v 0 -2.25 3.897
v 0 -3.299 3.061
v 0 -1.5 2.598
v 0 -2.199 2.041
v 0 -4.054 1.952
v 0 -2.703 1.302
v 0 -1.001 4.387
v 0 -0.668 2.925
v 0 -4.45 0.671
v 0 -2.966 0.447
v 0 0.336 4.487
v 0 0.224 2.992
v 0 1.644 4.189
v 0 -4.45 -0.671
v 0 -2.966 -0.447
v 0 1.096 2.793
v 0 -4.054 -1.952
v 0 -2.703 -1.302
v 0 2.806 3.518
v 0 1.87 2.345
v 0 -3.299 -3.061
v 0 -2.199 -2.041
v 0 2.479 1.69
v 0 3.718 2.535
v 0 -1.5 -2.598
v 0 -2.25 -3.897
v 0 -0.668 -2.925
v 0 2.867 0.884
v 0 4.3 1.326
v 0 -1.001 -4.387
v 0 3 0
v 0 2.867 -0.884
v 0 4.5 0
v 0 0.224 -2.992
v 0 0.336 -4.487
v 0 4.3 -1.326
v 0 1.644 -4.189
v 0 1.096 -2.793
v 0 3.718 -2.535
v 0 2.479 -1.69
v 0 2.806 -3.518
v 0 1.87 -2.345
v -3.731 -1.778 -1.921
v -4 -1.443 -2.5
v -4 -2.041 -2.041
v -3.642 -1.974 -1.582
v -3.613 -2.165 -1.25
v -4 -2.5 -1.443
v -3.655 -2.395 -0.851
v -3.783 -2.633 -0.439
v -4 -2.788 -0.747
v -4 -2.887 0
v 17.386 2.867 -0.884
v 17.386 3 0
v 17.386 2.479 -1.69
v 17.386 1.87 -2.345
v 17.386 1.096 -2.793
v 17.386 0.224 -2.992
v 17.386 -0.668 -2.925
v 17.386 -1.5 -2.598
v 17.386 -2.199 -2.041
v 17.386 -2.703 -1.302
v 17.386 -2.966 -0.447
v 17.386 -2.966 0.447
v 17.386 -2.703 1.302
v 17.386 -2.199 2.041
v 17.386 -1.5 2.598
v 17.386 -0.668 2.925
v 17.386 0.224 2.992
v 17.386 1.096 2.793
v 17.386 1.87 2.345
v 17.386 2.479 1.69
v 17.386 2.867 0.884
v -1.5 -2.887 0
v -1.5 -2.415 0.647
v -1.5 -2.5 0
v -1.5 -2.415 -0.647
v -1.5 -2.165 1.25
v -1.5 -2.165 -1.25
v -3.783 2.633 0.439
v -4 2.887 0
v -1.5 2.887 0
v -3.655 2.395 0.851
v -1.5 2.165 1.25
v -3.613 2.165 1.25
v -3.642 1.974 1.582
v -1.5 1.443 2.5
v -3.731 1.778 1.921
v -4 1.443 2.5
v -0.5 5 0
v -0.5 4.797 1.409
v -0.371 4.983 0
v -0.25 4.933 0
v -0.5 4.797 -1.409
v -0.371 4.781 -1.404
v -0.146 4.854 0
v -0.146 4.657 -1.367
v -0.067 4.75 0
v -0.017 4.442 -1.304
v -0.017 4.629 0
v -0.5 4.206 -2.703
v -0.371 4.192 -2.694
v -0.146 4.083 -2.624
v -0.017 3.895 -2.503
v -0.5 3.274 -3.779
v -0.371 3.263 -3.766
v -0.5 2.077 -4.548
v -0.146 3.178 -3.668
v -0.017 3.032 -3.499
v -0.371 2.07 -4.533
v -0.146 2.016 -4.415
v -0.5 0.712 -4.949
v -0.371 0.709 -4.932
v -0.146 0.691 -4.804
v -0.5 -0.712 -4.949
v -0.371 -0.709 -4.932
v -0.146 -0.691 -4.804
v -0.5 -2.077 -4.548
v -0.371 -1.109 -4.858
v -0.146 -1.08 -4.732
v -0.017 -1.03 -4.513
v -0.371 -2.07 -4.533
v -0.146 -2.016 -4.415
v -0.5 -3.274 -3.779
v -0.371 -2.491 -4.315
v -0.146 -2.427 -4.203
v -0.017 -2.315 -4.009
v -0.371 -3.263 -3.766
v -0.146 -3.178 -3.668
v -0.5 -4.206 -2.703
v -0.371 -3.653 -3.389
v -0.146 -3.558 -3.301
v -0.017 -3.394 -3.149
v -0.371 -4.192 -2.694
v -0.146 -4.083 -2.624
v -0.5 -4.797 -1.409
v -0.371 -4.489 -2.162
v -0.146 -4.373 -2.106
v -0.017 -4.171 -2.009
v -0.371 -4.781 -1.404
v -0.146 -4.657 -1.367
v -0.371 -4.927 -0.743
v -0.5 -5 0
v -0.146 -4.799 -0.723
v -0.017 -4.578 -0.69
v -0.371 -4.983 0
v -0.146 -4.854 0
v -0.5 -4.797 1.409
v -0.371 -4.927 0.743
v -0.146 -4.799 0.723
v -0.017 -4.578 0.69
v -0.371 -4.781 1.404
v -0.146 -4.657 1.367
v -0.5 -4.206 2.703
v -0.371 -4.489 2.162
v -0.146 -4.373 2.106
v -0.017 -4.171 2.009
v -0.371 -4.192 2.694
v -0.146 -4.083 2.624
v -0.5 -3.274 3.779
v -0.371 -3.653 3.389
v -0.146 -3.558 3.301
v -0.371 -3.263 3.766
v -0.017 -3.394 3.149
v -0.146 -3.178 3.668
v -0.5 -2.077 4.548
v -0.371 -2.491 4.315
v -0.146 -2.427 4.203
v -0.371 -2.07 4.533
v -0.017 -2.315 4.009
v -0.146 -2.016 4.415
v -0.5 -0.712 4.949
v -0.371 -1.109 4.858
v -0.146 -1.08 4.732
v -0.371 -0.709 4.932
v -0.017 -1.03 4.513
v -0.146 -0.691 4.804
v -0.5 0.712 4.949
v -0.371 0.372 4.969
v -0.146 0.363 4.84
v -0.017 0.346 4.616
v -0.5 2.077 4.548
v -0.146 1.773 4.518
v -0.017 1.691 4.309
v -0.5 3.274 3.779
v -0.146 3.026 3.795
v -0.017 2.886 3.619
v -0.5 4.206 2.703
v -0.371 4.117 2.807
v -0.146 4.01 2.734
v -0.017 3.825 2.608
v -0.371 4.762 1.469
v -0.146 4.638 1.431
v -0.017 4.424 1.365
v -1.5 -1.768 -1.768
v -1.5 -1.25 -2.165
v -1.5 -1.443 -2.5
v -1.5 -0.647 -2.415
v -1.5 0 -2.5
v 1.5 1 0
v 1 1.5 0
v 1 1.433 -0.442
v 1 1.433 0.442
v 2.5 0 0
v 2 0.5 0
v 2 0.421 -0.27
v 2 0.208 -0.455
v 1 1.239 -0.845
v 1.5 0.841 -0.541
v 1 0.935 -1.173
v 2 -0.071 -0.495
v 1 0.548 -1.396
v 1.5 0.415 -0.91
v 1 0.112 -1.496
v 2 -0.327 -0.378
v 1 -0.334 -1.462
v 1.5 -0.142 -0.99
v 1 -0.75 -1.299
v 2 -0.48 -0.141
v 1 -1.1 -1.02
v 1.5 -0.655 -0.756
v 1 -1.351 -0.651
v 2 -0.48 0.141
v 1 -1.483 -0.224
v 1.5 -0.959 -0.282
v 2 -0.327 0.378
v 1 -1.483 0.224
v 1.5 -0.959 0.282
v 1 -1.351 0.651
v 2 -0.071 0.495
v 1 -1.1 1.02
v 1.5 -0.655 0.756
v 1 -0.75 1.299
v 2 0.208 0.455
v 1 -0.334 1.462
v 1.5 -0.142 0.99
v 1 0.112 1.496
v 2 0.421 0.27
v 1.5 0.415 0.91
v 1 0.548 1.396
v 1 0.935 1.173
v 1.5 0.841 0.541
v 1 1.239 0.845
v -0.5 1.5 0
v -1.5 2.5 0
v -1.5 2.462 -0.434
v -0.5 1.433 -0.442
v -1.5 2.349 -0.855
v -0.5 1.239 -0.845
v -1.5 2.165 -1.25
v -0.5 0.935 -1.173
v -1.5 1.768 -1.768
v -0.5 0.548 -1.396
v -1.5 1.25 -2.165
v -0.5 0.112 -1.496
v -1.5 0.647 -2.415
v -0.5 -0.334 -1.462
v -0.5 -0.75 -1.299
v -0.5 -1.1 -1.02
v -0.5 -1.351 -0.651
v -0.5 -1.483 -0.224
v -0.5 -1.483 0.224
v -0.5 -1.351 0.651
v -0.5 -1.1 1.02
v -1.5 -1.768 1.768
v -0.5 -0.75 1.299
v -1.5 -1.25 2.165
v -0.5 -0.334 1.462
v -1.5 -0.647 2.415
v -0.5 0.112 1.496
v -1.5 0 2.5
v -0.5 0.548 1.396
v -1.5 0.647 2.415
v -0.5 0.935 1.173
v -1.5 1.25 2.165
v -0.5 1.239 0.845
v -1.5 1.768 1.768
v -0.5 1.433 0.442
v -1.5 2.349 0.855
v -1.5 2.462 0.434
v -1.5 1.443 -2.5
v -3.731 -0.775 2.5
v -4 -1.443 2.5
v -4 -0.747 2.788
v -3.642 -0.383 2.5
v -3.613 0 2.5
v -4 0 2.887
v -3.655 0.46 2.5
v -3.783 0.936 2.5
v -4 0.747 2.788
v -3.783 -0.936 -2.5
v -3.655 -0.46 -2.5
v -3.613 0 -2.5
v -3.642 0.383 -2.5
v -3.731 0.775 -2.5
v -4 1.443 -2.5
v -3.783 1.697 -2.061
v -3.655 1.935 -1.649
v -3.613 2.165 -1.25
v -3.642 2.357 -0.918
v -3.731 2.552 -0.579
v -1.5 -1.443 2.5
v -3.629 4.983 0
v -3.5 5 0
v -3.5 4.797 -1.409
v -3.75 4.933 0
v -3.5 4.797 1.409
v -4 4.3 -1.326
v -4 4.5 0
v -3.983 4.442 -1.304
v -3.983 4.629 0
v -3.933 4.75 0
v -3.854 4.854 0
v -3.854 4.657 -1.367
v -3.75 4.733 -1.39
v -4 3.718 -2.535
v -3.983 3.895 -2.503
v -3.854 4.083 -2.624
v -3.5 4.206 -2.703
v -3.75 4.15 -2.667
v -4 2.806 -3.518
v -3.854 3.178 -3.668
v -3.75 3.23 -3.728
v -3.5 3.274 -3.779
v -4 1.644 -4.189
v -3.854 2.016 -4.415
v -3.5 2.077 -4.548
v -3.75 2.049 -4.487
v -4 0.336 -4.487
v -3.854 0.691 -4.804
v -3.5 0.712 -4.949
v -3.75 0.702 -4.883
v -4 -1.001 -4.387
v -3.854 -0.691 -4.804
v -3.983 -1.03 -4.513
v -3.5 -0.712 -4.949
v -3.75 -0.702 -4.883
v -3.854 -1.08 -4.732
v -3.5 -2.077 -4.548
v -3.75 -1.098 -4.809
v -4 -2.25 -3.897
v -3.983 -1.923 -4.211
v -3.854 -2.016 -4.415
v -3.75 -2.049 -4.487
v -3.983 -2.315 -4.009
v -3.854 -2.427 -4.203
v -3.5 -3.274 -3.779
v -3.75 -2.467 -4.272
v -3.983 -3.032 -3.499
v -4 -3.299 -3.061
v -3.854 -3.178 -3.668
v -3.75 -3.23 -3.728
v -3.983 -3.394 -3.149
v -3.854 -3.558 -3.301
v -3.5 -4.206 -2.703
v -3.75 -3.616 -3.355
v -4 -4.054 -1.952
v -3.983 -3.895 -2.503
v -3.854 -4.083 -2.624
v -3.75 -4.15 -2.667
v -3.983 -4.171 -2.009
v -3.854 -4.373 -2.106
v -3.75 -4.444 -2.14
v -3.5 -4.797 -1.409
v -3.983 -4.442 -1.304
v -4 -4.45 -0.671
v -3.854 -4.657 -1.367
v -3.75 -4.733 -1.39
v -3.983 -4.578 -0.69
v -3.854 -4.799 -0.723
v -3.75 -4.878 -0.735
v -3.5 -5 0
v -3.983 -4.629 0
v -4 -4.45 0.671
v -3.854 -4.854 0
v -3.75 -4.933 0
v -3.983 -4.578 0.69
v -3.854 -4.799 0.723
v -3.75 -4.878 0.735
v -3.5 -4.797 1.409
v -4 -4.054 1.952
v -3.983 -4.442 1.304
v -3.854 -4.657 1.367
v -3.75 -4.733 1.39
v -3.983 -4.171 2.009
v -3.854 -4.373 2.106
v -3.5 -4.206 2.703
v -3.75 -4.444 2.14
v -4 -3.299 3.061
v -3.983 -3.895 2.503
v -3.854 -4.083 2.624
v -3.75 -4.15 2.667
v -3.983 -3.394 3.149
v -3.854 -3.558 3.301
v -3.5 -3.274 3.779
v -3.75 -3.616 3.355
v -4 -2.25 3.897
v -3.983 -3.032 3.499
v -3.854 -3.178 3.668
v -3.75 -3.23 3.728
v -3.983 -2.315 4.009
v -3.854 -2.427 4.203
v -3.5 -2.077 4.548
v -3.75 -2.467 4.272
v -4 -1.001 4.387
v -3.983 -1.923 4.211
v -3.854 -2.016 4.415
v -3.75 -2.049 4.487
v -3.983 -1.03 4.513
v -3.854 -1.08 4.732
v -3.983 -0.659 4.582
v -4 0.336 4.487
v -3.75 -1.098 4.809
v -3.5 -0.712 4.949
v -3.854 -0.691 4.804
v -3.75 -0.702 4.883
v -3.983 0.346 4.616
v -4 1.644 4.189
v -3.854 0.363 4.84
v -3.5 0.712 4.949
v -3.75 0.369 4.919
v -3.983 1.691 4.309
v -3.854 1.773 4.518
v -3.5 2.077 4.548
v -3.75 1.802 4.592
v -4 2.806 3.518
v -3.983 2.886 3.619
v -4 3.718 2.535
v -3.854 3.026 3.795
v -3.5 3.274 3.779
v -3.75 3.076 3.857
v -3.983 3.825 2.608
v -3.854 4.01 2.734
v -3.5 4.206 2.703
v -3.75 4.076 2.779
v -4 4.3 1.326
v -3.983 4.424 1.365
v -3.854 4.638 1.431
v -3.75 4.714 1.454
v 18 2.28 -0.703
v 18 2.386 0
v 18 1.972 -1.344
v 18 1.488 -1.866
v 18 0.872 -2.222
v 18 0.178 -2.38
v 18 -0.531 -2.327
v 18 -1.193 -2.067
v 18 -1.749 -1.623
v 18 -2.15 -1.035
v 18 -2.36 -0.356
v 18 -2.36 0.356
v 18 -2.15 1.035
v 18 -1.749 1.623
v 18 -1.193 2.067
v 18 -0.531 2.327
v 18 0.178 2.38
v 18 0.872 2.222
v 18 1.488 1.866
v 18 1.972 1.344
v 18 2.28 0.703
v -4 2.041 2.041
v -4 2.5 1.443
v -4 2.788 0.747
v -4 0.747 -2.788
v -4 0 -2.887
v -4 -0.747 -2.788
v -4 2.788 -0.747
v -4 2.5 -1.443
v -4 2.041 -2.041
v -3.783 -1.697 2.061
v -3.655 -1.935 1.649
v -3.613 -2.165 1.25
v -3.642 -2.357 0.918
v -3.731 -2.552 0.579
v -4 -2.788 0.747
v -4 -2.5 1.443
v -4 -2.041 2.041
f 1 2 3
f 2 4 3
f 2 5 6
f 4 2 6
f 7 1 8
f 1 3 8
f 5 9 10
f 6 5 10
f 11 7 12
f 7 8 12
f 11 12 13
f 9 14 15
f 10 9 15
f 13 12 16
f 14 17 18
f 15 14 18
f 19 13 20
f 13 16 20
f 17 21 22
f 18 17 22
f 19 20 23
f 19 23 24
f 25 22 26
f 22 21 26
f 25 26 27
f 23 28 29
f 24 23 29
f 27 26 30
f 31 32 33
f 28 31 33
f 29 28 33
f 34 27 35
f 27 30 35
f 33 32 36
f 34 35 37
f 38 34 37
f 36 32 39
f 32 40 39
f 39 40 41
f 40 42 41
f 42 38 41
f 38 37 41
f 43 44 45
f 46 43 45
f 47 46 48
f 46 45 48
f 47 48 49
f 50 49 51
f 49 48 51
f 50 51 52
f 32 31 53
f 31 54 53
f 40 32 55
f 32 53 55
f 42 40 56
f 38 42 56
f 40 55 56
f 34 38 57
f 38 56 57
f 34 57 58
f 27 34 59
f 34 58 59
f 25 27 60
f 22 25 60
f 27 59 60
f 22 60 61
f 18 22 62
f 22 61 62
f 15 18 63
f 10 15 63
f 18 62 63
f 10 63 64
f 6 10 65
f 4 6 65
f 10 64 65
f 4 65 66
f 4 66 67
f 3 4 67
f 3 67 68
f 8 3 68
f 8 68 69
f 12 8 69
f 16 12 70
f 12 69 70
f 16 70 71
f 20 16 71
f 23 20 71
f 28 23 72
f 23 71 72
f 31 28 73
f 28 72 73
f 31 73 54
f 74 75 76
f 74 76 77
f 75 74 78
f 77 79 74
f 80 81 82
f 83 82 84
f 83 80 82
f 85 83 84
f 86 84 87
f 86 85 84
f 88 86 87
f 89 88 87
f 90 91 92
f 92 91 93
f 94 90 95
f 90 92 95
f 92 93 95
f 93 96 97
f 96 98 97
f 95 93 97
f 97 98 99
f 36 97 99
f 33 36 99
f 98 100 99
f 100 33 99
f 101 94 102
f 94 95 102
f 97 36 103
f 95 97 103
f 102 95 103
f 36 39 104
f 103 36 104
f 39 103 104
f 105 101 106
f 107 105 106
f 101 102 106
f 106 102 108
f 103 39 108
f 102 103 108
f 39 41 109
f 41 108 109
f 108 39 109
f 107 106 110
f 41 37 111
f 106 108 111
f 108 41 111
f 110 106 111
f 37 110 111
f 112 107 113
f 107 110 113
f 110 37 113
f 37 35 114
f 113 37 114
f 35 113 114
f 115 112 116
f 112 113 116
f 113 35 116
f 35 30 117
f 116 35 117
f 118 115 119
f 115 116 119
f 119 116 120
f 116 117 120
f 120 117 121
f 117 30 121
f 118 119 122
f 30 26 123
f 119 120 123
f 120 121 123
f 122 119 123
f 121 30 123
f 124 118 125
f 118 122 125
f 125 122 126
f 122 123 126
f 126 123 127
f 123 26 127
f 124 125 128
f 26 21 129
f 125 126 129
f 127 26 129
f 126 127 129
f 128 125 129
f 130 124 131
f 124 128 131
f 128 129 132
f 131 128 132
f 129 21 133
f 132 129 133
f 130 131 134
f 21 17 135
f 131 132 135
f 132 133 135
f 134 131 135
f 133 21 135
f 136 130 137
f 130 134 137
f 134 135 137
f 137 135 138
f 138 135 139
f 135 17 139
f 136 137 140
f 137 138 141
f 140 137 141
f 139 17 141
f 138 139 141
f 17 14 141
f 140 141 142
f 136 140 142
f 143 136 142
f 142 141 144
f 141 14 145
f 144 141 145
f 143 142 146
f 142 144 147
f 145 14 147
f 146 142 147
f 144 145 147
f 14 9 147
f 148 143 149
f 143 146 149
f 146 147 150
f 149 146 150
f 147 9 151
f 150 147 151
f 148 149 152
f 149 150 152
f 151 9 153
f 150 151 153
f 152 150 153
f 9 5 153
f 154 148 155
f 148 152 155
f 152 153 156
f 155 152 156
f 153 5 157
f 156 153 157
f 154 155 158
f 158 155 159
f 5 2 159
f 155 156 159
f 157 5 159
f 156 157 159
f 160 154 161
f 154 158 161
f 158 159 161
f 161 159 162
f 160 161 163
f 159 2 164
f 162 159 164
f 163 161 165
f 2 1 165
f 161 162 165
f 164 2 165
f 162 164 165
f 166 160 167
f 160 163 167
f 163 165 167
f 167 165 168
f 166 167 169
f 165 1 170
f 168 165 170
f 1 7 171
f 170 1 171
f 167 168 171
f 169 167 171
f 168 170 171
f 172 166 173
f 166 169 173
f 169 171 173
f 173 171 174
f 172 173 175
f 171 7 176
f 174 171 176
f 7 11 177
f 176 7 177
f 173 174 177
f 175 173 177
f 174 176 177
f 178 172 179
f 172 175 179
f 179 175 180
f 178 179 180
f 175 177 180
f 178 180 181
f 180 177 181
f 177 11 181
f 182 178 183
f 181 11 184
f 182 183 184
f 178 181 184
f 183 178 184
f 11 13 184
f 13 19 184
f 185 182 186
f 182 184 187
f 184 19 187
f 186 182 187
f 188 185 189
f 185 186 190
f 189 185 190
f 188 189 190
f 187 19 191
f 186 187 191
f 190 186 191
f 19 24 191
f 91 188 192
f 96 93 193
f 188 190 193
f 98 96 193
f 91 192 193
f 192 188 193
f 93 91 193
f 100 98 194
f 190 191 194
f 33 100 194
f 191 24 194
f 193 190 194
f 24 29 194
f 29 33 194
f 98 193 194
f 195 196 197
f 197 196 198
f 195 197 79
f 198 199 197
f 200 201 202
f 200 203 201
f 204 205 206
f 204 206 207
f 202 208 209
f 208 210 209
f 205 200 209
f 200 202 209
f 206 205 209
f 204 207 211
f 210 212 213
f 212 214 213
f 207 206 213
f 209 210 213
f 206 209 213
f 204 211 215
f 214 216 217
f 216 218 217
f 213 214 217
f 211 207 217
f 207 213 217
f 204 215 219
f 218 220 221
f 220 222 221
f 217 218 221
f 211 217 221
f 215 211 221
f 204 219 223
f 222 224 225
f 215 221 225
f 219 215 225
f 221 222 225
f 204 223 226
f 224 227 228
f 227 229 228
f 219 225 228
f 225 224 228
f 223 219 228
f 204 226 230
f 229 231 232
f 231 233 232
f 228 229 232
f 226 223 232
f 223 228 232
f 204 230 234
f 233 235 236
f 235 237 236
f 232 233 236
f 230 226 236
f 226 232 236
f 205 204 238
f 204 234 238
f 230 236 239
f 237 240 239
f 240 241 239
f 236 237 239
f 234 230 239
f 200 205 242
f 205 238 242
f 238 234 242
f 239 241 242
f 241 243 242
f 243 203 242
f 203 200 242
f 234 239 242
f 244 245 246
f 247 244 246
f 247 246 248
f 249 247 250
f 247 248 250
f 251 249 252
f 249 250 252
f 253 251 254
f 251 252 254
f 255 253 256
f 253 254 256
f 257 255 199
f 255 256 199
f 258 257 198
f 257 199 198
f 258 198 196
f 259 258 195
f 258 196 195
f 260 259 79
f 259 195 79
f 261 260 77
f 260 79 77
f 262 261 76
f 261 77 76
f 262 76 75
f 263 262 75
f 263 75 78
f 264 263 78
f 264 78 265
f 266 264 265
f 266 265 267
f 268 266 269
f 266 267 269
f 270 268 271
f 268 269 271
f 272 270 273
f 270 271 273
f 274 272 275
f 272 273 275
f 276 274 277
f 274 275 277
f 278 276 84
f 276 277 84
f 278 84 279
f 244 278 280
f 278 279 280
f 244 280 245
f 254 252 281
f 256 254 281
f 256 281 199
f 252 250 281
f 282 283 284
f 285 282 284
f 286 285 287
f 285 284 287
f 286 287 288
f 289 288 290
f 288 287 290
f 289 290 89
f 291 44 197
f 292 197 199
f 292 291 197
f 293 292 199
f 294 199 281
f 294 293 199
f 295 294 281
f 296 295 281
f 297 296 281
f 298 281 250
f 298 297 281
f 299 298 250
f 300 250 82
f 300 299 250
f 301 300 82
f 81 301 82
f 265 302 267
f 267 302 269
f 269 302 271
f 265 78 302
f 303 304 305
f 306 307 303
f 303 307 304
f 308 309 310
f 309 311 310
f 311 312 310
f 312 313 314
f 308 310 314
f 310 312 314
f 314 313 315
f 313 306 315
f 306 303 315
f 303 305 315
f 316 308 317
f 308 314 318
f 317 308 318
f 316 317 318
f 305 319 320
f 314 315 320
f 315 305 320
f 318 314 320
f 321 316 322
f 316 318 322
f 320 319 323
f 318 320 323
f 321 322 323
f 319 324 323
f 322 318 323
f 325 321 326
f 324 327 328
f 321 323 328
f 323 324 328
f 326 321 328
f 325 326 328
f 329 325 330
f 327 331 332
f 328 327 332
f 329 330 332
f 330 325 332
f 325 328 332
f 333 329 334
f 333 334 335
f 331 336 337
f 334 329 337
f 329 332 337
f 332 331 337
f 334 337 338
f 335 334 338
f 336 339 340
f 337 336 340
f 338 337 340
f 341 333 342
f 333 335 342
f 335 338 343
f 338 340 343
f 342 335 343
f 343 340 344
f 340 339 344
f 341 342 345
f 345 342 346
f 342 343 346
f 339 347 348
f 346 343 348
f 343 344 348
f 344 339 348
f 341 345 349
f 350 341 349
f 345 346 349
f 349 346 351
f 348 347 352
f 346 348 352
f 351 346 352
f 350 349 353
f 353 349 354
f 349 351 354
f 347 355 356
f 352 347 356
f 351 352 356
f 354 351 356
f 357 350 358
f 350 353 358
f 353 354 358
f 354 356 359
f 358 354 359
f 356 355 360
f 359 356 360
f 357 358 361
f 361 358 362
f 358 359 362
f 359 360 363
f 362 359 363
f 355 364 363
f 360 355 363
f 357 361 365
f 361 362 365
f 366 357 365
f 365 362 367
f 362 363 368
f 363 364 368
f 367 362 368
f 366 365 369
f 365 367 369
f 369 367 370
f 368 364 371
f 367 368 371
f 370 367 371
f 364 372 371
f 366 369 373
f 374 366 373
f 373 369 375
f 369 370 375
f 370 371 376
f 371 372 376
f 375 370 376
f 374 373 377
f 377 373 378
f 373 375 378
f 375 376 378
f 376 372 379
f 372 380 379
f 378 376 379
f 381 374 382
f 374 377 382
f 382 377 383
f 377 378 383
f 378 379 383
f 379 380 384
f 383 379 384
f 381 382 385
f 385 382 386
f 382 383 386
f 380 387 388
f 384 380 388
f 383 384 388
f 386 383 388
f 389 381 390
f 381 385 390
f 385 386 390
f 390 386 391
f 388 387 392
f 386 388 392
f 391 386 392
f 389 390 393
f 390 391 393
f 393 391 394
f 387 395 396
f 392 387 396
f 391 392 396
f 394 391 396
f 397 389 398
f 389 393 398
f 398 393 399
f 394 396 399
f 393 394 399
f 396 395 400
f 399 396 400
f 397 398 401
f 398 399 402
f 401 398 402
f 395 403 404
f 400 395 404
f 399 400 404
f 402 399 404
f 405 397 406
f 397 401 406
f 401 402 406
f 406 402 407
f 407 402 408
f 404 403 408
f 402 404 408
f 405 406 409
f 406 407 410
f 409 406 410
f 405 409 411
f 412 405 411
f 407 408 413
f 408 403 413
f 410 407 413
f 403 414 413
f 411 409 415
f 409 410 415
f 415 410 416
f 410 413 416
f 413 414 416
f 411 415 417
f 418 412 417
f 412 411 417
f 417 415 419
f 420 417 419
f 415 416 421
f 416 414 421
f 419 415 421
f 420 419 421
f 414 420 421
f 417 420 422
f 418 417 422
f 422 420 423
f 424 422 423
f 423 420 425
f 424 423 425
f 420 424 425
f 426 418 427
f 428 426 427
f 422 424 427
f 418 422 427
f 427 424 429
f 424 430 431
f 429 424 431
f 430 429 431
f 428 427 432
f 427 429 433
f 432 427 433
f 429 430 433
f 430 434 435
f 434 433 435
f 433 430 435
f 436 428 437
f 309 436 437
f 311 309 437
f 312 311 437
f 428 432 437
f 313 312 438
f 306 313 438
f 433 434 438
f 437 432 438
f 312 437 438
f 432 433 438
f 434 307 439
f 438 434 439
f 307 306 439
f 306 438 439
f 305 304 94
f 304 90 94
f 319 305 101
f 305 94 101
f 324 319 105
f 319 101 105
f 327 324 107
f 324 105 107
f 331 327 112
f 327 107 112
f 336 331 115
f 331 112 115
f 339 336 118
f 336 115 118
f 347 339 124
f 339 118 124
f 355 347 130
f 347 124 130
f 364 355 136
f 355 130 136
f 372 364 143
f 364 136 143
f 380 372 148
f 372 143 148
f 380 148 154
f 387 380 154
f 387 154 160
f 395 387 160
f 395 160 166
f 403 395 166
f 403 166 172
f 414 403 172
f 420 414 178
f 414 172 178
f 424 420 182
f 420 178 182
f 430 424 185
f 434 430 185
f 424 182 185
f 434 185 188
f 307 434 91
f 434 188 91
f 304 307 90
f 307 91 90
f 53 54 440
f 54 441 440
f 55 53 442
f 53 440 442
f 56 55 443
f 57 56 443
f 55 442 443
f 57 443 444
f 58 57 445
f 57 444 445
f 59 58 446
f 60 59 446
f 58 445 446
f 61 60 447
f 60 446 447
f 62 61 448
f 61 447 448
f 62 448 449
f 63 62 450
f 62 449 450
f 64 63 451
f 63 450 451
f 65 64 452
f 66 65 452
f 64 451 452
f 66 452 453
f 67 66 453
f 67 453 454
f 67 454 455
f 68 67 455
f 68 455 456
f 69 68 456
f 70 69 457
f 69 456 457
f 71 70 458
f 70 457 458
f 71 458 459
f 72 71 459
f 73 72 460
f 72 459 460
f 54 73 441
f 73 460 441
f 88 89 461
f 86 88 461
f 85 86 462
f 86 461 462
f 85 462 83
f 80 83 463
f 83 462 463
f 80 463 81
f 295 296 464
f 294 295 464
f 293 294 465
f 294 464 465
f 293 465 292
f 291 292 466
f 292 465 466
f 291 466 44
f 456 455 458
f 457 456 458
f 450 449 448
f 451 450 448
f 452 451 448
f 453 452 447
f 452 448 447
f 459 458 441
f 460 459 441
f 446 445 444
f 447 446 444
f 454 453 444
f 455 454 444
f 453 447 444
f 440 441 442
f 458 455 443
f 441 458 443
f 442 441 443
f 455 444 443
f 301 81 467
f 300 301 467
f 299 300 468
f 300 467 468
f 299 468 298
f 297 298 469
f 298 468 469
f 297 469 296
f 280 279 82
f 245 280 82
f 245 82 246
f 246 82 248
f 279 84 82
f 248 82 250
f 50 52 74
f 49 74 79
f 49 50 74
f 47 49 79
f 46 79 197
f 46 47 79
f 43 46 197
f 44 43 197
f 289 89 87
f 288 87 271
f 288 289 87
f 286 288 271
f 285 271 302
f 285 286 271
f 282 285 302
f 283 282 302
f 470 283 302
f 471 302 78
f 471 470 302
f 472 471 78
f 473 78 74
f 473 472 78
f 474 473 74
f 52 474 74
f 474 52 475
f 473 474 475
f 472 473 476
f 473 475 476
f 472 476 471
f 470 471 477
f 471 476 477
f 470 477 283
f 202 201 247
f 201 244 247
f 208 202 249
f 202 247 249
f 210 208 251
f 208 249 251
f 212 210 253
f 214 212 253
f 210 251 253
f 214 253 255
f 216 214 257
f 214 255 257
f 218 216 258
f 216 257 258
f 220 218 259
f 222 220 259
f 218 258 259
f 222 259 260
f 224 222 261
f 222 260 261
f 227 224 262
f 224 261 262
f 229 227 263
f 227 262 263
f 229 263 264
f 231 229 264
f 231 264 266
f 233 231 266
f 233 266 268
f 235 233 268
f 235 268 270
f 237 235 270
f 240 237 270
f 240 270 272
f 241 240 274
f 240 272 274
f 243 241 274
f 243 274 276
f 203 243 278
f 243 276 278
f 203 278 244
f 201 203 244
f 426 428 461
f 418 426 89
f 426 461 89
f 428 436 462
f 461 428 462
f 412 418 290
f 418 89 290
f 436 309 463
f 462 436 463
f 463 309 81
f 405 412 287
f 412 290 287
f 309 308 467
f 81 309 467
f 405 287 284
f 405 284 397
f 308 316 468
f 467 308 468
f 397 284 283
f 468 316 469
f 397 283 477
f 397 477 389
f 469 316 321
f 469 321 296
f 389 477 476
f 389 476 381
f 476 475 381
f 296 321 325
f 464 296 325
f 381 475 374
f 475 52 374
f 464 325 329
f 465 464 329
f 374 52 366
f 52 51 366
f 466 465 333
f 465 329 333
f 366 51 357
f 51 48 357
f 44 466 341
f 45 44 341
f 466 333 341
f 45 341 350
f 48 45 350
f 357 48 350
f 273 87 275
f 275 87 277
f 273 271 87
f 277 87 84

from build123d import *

# Parameters (mm, degrees)
CUT_EXTRUDE1_DEPTH = 2.5


with BuildPart() as part:
    # Sketch1 → Revolve1 (revolve)
    with BuildSketch(Plane.XY):
        with BuildLine():
            Line((2.5, 0), (1, 1.5))
            Line((1, 1.5), (-0.5, 1.5))
            Line((-0.5, 1.5), (-1.5, 2.5))
            Line((-1.5, 2.5), (-3.613248654, 2.5))
            Line((-3.613248654, 2.5), (-4, 2.886751346))
            Line((-4, 2.886751346), (-4, 4.5))
            ThreePointArc((-4, 4.5), (-3.853553391, 4.853553391), (-3.5, 5))
            Line((-3.5, 5), (-0.5, 5))
            ThreePointArc((-0.5, 5), (-0.146446609, 4.853553391), (0, 4.5))
            Line((0, 4.5), (0, 3))
            Line((0, 3), (17.3865, 3))
            Line((17.3865, 3), (18, 2.3865))
            Line((18, 2.3865), (18, 0))
            Line((18, 0), (2.5, 0))
        make_face()
    revolve(axis=Axis((18, 0, 0), (-1, 0, 0)))

    # Sketch2 → Cut-Extrude1 (cut)
    with BuildSketch(Plane(origin=(-4, 0, 0), x_dir=(0, 0, -1), z_dir=(1, 0, 0))):
        Polygon((-2.5, -1.443375673), (0, -2.886751346), (2.5, -1.443375673), (2.5, 1.443375673), (0, 2.886751346), (-2.5, 1.443375673), align=None)
    extrude(amount=CUT_EXTRUDE1_DEPTH, mode=Mode.SUBTRACT)


solid = part.part
